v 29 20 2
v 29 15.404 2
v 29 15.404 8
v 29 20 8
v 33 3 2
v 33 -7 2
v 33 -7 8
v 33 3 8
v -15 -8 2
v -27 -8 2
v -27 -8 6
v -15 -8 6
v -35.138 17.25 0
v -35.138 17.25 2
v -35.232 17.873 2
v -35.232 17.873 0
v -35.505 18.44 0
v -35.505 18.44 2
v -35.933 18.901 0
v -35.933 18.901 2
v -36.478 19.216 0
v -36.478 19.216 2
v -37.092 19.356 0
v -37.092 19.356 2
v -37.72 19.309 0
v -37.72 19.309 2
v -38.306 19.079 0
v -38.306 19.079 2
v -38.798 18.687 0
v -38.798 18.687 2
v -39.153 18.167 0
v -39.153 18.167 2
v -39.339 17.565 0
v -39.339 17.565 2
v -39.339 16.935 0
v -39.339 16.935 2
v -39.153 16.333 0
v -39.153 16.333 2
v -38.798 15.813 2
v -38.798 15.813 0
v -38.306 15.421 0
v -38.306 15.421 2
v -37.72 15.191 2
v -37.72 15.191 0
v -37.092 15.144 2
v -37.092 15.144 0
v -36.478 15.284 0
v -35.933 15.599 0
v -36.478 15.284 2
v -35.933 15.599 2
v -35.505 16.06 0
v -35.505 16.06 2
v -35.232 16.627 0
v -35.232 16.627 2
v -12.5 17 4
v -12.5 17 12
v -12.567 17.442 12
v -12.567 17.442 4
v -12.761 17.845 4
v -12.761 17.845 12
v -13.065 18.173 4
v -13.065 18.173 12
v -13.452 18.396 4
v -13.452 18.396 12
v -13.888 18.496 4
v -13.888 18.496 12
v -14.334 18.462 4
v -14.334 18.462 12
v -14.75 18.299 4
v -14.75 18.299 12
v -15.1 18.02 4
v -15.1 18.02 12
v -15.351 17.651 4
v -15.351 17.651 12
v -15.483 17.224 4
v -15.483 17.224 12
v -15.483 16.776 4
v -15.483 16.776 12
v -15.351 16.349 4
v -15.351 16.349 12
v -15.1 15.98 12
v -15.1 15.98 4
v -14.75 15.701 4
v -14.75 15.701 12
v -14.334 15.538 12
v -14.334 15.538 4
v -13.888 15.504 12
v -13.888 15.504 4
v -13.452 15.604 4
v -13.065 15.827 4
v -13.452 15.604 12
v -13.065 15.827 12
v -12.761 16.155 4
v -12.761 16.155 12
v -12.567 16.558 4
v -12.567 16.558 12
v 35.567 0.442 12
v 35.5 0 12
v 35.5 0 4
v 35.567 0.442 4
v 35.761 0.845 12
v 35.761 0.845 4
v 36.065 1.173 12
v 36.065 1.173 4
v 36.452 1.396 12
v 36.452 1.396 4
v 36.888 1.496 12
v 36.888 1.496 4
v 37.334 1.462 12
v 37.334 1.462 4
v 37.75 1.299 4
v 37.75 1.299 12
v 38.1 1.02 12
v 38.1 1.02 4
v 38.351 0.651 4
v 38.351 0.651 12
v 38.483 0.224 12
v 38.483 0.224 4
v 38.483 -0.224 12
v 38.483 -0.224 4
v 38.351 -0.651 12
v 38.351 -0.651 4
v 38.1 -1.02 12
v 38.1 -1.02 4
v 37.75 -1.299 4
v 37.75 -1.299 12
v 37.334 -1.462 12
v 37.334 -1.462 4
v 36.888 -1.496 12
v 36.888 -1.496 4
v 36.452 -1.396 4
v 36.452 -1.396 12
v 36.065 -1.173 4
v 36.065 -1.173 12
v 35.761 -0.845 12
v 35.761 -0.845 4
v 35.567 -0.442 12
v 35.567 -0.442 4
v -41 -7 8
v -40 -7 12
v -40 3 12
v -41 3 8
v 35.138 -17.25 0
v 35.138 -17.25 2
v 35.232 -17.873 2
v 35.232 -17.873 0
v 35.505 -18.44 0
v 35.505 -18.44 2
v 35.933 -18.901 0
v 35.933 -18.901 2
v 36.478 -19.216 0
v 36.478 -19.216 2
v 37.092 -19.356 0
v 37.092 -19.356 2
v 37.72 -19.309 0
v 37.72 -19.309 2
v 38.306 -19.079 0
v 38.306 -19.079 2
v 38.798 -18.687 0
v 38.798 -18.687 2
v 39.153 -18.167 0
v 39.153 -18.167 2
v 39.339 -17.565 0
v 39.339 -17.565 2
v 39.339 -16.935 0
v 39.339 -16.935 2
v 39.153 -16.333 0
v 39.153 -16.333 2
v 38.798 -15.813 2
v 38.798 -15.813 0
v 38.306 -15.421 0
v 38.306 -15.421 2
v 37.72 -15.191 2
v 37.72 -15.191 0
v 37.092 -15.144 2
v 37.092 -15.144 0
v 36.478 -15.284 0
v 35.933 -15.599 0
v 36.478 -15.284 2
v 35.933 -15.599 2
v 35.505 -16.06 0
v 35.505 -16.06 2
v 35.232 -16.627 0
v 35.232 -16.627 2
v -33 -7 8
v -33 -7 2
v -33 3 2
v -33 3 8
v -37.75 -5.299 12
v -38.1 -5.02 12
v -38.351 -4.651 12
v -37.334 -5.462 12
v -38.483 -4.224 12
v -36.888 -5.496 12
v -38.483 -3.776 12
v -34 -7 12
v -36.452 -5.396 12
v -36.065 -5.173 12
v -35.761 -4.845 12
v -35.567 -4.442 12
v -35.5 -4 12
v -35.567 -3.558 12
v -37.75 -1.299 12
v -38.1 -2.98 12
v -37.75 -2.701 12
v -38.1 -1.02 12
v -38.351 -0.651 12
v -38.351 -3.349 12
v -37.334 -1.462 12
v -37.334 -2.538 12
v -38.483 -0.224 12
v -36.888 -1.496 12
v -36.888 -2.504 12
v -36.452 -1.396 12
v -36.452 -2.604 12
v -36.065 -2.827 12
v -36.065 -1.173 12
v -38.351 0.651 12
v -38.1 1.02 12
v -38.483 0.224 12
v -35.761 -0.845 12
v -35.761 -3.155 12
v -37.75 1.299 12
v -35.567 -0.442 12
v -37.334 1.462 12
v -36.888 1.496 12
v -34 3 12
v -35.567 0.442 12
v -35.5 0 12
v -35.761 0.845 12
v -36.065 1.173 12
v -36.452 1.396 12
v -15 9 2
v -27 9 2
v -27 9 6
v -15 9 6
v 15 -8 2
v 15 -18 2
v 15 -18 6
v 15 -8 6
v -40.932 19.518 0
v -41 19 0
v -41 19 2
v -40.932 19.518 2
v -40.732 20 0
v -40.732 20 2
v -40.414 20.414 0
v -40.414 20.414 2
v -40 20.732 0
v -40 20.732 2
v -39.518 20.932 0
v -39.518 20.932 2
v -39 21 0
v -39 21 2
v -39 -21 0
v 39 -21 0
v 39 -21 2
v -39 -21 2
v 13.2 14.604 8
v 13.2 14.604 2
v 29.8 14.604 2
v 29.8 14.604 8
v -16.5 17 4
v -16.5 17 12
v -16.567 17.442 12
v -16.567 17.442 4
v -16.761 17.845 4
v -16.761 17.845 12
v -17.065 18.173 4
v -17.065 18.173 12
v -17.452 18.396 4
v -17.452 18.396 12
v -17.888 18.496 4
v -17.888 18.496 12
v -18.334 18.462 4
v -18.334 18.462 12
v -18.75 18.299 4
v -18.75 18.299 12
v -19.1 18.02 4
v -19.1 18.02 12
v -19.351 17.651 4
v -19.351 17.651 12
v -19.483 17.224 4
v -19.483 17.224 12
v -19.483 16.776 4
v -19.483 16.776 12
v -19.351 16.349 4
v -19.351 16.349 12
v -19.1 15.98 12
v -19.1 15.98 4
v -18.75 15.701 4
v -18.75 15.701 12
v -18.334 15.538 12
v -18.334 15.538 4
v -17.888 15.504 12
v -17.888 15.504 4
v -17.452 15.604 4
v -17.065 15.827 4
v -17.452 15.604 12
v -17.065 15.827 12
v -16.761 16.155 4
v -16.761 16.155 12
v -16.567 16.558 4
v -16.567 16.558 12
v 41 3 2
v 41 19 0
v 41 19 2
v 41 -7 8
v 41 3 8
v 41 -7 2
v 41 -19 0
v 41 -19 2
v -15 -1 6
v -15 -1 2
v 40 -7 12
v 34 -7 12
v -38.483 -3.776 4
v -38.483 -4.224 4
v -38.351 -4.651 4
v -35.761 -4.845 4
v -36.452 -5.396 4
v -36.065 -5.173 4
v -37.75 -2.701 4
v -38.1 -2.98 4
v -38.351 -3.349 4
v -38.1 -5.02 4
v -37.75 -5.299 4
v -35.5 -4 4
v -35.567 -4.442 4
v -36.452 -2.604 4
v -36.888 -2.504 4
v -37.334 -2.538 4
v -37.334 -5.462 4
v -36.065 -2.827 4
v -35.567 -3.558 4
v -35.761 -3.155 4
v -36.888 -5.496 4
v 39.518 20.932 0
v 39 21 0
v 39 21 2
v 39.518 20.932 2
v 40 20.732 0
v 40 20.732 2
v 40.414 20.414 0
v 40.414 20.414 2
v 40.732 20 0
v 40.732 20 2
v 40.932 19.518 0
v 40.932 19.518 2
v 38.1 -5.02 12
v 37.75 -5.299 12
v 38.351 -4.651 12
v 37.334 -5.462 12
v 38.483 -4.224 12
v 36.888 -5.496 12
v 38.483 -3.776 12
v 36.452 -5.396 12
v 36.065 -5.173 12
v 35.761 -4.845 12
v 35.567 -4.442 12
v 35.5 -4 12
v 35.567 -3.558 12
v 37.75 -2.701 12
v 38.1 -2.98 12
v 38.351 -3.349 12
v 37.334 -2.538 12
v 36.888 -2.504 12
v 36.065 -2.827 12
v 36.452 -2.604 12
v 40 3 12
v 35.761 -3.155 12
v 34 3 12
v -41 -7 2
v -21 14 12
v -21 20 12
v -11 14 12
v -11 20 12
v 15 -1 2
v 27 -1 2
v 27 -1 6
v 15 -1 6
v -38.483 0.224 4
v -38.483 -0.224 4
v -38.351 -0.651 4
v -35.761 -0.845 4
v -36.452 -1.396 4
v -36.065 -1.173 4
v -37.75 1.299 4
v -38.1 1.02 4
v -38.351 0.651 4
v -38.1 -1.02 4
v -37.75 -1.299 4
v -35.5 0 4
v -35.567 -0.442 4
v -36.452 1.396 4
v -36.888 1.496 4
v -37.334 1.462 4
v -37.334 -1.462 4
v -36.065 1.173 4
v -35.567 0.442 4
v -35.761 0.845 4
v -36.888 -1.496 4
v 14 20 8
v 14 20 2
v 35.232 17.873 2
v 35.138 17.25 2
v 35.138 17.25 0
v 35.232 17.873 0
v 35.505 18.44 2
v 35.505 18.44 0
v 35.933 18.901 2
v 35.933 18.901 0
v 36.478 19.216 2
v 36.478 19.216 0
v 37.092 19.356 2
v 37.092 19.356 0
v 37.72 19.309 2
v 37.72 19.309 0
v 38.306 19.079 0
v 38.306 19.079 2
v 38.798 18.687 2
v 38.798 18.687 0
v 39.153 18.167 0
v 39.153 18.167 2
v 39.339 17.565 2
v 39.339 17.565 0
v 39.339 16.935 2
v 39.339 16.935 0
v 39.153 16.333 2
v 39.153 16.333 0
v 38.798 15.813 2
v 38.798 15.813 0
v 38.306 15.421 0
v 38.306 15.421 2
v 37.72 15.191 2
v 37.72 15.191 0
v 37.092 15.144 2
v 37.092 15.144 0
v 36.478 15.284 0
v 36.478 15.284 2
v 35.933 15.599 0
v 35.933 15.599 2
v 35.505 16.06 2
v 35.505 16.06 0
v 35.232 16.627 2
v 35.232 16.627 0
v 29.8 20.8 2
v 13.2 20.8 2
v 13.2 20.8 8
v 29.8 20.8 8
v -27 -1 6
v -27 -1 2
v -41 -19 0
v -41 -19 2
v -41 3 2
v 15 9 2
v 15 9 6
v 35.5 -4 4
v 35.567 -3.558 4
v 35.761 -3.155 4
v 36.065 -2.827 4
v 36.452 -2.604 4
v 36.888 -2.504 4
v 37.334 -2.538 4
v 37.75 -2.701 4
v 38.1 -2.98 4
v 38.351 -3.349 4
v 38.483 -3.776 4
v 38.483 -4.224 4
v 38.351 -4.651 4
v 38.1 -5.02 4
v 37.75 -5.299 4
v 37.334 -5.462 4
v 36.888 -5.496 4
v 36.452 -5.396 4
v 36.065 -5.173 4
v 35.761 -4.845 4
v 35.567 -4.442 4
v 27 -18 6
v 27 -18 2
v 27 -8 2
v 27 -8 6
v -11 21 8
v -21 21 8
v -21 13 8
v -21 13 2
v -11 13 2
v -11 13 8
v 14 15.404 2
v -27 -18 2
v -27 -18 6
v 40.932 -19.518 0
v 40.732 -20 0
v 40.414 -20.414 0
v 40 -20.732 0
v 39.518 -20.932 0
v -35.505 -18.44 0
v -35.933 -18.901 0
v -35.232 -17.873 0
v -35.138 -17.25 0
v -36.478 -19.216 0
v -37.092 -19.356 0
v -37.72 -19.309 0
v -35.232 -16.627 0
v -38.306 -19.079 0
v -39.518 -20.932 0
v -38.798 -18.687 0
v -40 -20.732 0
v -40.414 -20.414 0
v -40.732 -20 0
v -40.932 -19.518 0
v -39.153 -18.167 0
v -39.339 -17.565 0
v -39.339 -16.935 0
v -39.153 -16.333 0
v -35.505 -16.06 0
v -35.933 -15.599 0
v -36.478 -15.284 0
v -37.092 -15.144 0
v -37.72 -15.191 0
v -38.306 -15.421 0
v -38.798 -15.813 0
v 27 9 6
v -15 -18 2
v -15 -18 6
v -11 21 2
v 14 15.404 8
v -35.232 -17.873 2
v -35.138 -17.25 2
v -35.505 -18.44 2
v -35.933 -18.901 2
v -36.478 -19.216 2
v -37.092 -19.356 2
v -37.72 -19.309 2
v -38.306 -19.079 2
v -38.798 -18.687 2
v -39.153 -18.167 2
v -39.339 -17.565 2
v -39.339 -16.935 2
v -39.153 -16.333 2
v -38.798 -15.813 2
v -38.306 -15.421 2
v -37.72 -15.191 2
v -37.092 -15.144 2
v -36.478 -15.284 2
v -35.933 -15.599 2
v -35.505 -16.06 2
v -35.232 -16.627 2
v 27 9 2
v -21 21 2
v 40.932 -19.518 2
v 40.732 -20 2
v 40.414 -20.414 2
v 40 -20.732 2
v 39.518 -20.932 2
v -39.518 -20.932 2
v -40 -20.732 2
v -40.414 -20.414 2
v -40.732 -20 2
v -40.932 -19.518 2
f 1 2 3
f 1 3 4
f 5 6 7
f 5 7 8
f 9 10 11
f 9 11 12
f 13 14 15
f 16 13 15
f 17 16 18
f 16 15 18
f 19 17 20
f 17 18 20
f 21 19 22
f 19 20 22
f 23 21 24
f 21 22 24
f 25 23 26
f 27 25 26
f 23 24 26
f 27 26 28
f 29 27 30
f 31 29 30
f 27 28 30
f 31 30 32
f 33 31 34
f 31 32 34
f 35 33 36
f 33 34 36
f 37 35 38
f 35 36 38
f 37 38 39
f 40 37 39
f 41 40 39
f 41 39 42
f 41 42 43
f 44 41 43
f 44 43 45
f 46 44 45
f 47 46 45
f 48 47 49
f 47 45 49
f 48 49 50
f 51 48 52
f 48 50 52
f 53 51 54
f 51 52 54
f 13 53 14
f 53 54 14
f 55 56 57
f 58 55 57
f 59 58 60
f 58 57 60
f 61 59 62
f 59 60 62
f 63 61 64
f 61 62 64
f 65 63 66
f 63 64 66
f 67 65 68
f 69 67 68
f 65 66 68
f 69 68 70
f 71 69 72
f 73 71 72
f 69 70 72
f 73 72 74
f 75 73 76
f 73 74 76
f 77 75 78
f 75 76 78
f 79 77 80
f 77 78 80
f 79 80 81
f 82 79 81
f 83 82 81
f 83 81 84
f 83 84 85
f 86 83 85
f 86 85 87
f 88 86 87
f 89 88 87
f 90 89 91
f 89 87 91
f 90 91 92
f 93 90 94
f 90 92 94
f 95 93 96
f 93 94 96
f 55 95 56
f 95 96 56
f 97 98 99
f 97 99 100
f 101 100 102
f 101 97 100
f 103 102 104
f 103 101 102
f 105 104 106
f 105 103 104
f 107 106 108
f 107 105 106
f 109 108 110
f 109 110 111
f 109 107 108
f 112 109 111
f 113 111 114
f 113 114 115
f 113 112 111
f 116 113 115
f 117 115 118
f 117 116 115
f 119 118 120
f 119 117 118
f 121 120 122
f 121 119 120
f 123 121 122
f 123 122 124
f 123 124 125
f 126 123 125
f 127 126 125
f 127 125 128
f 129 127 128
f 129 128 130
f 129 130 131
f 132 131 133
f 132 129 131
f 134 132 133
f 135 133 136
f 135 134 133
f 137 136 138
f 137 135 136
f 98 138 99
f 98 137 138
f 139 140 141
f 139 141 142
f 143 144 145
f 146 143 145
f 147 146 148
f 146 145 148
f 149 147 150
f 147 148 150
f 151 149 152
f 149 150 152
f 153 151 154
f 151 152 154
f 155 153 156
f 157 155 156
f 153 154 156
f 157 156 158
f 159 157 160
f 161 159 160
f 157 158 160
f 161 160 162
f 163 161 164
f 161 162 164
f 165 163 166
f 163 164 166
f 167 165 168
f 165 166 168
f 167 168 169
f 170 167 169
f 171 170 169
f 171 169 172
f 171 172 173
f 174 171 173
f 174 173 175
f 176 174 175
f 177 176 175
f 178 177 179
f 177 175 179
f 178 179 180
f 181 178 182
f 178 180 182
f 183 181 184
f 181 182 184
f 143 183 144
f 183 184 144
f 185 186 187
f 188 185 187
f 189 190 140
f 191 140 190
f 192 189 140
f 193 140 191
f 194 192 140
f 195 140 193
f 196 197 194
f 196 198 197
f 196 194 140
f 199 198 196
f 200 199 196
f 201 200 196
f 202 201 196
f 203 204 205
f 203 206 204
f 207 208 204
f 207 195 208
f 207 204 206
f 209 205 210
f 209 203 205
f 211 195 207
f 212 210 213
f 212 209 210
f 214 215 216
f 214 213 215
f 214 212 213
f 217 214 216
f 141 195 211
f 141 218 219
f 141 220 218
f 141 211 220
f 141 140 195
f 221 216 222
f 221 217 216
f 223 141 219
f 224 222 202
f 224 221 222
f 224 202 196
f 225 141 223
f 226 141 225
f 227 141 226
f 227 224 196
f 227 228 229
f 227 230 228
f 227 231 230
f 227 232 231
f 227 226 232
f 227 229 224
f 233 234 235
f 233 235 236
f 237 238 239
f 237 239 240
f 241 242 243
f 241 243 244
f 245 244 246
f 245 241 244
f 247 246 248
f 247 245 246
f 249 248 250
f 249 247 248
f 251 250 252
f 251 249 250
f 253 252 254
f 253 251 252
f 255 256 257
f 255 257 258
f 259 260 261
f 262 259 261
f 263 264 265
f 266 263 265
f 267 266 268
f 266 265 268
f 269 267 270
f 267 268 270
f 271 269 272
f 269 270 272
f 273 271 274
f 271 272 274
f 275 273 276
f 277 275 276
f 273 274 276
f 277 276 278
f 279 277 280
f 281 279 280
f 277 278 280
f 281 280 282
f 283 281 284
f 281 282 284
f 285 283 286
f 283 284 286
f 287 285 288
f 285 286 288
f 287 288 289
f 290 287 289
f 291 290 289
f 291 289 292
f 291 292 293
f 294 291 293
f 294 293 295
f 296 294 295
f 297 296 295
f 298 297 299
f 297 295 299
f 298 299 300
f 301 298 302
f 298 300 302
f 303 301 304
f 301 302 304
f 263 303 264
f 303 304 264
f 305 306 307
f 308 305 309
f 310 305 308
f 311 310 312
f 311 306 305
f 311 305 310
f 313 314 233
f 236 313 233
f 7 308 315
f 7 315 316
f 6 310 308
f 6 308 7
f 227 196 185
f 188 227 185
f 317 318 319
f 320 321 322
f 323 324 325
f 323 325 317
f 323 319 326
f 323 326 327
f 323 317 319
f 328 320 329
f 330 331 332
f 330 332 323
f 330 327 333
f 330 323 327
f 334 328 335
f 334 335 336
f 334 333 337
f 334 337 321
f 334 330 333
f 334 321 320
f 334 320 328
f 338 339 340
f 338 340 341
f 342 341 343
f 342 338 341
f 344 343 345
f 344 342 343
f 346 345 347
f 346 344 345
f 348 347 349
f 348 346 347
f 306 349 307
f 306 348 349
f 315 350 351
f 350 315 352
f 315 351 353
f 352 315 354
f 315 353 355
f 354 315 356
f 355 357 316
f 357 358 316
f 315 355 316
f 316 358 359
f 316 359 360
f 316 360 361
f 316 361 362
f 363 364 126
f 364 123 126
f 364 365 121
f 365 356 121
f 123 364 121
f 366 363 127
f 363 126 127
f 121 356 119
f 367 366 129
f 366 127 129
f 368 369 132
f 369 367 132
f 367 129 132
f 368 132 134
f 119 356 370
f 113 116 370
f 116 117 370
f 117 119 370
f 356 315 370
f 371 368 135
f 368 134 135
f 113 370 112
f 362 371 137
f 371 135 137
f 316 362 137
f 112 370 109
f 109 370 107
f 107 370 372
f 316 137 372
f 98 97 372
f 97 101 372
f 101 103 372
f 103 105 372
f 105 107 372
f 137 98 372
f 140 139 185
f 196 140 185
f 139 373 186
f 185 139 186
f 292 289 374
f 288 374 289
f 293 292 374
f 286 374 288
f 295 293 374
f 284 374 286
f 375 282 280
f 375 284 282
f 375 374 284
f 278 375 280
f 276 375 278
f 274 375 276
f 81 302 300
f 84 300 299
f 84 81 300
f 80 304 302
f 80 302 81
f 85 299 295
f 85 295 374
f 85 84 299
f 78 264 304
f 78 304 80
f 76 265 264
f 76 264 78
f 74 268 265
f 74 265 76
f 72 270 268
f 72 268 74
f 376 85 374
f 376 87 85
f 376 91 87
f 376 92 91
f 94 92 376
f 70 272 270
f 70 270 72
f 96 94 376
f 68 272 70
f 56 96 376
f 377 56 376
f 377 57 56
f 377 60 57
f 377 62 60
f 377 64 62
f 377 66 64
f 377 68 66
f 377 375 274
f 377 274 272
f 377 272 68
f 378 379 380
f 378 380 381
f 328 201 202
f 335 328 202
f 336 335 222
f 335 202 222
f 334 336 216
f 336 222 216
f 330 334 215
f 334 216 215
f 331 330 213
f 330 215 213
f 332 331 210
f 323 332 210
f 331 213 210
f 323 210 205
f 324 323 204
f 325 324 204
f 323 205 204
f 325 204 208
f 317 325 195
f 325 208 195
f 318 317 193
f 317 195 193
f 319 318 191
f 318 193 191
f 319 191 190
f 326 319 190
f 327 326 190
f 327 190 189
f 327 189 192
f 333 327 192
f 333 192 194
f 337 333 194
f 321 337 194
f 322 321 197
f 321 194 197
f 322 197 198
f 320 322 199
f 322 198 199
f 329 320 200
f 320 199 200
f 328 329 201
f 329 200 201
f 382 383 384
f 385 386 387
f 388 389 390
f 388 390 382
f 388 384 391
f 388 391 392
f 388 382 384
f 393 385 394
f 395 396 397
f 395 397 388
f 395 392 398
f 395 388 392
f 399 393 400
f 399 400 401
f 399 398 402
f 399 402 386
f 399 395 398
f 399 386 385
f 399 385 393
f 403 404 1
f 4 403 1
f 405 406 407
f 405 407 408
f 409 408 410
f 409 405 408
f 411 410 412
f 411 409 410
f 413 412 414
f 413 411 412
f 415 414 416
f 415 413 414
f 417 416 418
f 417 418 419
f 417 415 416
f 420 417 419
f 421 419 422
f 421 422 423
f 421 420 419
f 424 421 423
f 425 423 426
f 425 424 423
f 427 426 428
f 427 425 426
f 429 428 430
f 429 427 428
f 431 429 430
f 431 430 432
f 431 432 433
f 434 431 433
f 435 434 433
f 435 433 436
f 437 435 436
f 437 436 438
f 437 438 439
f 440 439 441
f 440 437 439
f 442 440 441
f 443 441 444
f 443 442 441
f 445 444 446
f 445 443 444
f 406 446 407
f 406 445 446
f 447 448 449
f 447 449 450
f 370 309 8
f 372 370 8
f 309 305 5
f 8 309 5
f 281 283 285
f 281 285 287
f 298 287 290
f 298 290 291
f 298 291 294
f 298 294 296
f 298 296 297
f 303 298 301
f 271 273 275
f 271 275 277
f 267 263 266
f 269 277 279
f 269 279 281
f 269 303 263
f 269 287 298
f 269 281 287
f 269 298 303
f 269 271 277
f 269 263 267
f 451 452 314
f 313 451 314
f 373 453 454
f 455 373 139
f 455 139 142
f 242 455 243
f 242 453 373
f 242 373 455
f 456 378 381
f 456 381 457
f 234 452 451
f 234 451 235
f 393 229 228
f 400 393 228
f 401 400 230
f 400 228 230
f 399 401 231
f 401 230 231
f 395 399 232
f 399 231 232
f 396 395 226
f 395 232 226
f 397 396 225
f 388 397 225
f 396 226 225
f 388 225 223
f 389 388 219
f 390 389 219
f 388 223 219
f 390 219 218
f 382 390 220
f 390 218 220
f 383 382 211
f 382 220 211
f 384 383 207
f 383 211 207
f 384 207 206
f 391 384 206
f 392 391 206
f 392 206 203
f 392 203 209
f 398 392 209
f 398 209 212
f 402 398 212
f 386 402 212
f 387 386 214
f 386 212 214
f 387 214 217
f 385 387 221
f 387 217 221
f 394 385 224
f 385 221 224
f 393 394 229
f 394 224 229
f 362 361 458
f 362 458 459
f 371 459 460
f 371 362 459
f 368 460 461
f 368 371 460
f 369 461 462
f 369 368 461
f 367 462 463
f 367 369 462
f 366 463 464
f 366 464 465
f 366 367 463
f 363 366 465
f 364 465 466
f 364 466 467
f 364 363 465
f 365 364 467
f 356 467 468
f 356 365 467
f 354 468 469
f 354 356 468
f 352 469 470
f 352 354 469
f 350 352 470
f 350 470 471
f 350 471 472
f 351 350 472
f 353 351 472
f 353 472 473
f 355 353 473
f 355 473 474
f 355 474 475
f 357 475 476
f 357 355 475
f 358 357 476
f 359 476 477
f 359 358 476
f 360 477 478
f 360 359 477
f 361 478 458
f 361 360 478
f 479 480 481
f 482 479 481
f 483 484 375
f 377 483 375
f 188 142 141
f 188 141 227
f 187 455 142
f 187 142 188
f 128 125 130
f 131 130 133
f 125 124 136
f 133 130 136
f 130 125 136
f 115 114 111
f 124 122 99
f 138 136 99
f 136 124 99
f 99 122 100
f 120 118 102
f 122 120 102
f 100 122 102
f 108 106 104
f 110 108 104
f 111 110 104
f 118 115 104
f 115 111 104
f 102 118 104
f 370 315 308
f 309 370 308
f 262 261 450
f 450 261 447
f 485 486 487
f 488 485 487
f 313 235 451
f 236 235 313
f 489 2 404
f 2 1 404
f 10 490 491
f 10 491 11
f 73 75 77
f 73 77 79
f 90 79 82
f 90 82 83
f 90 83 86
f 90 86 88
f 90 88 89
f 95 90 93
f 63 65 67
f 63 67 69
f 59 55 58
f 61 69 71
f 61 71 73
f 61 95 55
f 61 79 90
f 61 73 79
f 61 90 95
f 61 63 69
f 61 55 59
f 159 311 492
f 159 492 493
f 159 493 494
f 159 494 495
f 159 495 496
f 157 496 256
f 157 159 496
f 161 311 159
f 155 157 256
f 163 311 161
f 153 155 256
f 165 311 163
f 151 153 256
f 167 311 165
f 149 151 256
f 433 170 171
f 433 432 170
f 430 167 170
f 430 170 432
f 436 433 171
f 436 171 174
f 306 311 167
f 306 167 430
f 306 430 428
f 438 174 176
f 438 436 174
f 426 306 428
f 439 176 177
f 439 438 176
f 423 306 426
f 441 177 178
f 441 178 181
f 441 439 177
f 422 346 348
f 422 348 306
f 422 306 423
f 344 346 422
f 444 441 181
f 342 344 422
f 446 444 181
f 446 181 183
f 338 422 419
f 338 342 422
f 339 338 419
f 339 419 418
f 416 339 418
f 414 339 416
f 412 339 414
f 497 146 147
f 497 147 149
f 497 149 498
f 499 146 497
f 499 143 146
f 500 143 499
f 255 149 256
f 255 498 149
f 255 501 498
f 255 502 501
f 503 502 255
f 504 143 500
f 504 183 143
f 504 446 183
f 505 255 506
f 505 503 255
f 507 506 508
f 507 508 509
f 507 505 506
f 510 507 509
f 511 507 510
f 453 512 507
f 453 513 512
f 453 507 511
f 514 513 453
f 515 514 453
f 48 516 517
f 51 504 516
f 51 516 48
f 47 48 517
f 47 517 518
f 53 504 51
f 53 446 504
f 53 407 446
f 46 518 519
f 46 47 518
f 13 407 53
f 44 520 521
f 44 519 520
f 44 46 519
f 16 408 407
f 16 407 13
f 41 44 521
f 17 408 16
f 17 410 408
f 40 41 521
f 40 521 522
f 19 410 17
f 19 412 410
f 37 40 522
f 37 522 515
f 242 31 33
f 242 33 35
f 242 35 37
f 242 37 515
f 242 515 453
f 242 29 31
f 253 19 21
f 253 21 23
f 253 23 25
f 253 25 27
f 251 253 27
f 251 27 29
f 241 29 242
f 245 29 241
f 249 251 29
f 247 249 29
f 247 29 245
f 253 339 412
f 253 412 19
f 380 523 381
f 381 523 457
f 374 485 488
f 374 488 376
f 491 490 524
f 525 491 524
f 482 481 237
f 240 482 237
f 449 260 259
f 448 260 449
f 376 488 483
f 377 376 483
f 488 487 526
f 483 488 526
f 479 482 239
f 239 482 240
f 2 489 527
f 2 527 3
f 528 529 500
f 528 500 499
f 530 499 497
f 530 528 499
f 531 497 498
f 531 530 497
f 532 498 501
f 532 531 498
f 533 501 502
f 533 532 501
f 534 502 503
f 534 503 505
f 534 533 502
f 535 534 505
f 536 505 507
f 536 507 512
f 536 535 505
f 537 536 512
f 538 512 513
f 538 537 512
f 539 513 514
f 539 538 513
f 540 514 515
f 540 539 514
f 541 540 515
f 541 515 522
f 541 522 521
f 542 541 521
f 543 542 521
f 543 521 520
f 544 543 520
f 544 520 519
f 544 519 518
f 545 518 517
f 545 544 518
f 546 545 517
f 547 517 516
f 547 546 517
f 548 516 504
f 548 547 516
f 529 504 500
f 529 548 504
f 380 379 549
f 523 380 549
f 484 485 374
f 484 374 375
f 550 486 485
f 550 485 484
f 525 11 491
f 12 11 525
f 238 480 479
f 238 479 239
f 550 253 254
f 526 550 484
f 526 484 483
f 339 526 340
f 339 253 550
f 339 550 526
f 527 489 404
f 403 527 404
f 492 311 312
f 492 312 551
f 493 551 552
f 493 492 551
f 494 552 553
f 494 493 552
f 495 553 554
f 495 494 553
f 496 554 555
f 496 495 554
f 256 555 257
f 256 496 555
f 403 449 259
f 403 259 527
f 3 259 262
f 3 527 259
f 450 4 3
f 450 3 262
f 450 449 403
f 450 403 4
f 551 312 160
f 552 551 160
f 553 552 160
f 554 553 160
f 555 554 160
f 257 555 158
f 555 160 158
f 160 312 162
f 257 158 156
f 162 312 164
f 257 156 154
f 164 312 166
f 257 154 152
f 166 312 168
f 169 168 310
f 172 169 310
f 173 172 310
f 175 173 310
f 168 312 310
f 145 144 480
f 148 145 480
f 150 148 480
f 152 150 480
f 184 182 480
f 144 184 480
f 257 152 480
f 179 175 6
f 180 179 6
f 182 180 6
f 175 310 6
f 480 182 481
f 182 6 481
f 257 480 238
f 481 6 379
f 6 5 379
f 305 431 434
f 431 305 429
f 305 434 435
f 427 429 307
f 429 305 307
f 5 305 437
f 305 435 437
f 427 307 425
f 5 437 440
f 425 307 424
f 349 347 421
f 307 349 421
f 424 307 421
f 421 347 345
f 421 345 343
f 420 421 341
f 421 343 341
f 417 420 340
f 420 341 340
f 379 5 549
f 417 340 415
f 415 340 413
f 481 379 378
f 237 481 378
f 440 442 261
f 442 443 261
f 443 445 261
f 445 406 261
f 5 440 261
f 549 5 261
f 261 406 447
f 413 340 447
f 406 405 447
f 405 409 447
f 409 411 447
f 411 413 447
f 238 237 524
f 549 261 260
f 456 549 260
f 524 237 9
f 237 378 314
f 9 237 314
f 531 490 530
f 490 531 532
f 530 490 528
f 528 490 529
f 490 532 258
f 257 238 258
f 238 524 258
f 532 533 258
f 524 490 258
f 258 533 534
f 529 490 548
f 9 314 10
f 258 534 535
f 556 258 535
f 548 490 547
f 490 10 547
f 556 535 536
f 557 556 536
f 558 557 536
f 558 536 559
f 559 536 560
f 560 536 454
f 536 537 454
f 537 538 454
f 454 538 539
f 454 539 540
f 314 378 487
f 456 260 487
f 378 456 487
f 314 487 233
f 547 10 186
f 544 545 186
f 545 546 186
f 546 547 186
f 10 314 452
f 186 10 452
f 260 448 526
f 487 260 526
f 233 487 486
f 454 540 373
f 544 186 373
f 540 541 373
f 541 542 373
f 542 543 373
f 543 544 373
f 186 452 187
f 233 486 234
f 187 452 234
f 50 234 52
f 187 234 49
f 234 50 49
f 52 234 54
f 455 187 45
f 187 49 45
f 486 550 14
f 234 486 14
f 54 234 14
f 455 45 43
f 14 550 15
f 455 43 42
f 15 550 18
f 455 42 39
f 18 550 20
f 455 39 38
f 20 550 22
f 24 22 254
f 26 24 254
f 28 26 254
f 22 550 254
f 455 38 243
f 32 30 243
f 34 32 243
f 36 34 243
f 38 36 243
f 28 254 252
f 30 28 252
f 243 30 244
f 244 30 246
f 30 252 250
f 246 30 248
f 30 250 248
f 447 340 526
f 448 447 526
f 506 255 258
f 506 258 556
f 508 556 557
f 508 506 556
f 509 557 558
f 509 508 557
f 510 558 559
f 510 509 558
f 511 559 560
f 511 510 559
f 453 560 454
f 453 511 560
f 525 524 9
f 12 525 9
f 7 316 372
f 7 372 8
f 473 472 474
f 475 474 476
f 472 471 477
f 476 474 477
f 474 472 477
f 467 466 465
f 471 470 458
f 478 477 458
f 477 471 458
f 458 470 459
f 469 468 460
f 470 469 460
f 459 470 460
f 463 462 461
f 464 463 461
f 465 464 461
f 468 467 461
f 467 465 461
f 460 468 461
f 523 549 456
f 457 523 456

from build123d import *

# Parameters (mm, degrees)
EXTRUDE_1_DEPTH          = 2
SKETCH_2_R               = 2.112337694
CUT_EXTRUDE_1_DEPTH      = 2
MIRROR_2_COPY_1_SKETCH_R = 2.112337694
MIRROR_2_COPY_1_DEPTH    = 2
SKETCH_3_W               = 8
SKETCH_3_H               = 10
EXTRUDE_2_DEPTH          = 10
CUT_EXTRUDE_2_DEPTH      = 10
SKETCH_5_R               = 1.5
CUT_EXTRUDE_3_DEPTH      = 8
SKETCH_6_W               = 10
SKETCH_6_H               = 8
EXTRUDE_3_DEPTH          = 10
CUT_EXTRUDE_4_DEPTH      = 10
SKETCH_8_R               = 1.5
CUT_EXTRUDE_5_DEPTH      = 8
SKETCH_9_W               = 16.6
SKETCH_9_H               = 6.196182774
SKETCH_9_W_2             = 15
SKETCH_9_H_2             = 4.596182774
EXTRUDE_1_2_DEPTH        = 6
SKETCH_10_W              = 12
SKETCH_10_H              = 10
EXTRUDE_4_DEPTH          = 4
SKETCH_12_W              = 12
SKETCH_12_H              = 10
EXTRUDE_5_DEPTH          = 4


with BuildPart() as part:
    # 草图1 → Extrude 1 (new body)
    with BuildSketch(Plane.XY):
        with BuildLine():
            Line((-39, 21), (39, 21))
            ThreePointArc((39, 21), (40.414213562, 20.414213562), (41, 19))
            Line((41, 19), (41, -19))
            ThreePointArc((41, -19), (40.414213562, -20.414213562), (39, -21))
            Line((39, -21), (-39, -21))
            ThreePointArc((-39, -21), (-40.414213562, -20.414213562), (-41, -19))
            Line((-41, -19), (-41, 19))
            ThreePointArc((-41, 19), (-40.414213562, 20.414213562), (-39, 21))
        make_face()
    extrude(amount=EXTRUDE_1_DEPTH)

    # 草图2 → 切除-拉伸1 (cut)
    with BuildSketch(Plane.XY.offset(2)):
        with Locations((-37.25, 17.25)):
            Circle(SKETCH_2_R)
    cut_extrude_1 = extrude(amount=-CUT_EXTRUDE_1_DEPTH, mode=Mode.SUBTRACT)

    # 镜向1: 切除-拉伸1 across plane
    add(cut_extrude_1.mirror(Plane.ZX), mode=Mode.SUBTRACT)

    # 镜向2: 切除-拉伸1 across plane
    add(cut_extrude_1.mirror(Plane(origin=(0, 0, 0), x_dir=(0, 0, 1), z_dir=(1, 0, 0))), mode=Mode.SUBTRACT)

    # 镜向2 copy 1 sketch → 镜向2 copy 1 (cut)
    with BuildSketch(Plane(origin=(0, 0, 2), x_dir=(-1, 0, 0), z_dir=(0, 0, 1))):
        with Locations((-37.25, 17.25)):
            Circle(MIRROR_2_COPY_1_SKETCH_R)
    extrude(amount=-MIRROR_2_COPY_1_DEPTH, mode=Mode.SUBTRACT)

    # 草图3 → 凸台-拉伸2 (add)
    with BuildSketch(Plane.XY.offset(2)):
        with Locations((-37, -2)):
            Rectangle(SKETCH_3_W, SKETCH_3_H)
    extrude_2 = extrude(amount=EXTRUDE_2_DEPTH)

    # 草图4 → 切除-拉伸2 (cut)
    with BuildSketch(Plane.XZ.offset(7)):
        Polygon((-40, 12), (-41, 8), (-41, 12), align=None)
        Polygon((-33, 12), (-34, 12), (-33, 8), align=None)
    cut_extrude_2 = extrude(amount=-CUT_EXTRUDE_2_DEPTH, mode=Mode.SUBTRACT)

    # 草图5 → 切除-拉伸3 (cut)
    with BuildSketch(Plane.XY.offset(12)):
        with Locations((-37, 0)):
            Circle(SKETCH_5_R)
        with Locations((-37, -4)):
            Circle(SKETCH_5_R)
    cut_extrude_3 = extrude(amount=-CUT_EXTRUDE_3_DEPTH, mode=Mode.SUBTRACT)

    # 镜向3: 凸台-拉伸2, 切除-拉伸2, 切除-拉伸3 across plane
    add(extrude_2.mirror(Plane(origin=(0, 0, 0), x_dir=(0, 0, 1), z_dir=(1, 0, 0))))
    add(cut_extrude_2.mirror(Plane(origin=(0, 0, 0), x_dir=(0, 0, 1), z_dir=(1, 0, 0))), mode=Mode.SUBTRACT)
    add(cut_extrude_3.mirror(Plane(origin=(0, 0, 0), x_dir=(0, 0, 1), z_dir=(1, 0, 0))), mode=Mode.SUBTRACT)

    # 草图6 → 凸台-拉伸3 (add)
    with BuildSketch(Plane.XY.offset(2)):
        with Locations((-16, 17)):
            Rectangle(SKETCH_6_W, SKETCH_6_H)
    extrude(amount=EXTRUDE_3_DEPTH)

    # 草图7 → 切除-拉伸4 (cut)
    with BuildSketch(Plane.ZY.offset(21)):
        Polygon((8, 21), (12, 20), (12, 21), align=None)
        Polygon((12, 13), (8, 13), (12, 14), align=None)
    extrude(amount=-CUT_EXTRUDE_4_DEPTH, mode=Mode.SUBTRACT)

    # 草图8 → 切除-拉伸5 (cut)
    with BuildSketch(Plane.XY.offset(12)):
        with Locations((-14, 17)):
            Circle(SKETCH_8_R)
        with Locations((-18, 17)):
            Circle(SKETCH_8_R)
    extrude(amount=-CUT_EXTRUDE_5_DEPTH, mode=Mode.SUBTRACT)

    # 草图9 → Extrude 1 2 (add)
    with BuildSketch(Plane.XY.offset(2)):
        with Locations((21.5, 17.701908613)):
            Rectangle(SKETCH_9_W, SKETCH_9_H)
        with Locations((21.5, 17.701908613)):
            Rectangle(SKETCH_9_W_2, SKETCH_9_H_2, mode=Mode.SUBTRACT)
    extrude(amount=EXTRUDE_1_2_DEPTH)

    # 草图10 → 凸台-拉伸4 (add)
    with BuildSketch(Plane.XY.offset(2)):
        with Locations((-21, 4)):
            Rectangle(SKETCH_10_W, SKETCH_10_H)
    extrude_4 = extrude(amount=EXTRUDE_4_DEPTH)

    # 草图12 → 凸台-拉伸5 (add)
    with BuildSketch(Plane.XY.offset(2)):
        with Locations((-21, -13)):
            Rectangle(SKETCH_12_W, SKETCH_12_H)
    extrude_5 = extrude(amount=EXTRUDE_5_DEPTH)

    # 镜向4: 凸台-拉伸4, 凸台-拉伸5 across plane
    add(extrude_4.mirror(Plane(origin=(0, 0, 0), x_dir=(0, 0, 1), z_dir=(1, 0, 0))))
    add(extrude_5.mirror(Plane(origin=(0, 0, 0), x_dir=(0, 0, 1), z_dir=(1, 0, 0))))


solid = part.part
